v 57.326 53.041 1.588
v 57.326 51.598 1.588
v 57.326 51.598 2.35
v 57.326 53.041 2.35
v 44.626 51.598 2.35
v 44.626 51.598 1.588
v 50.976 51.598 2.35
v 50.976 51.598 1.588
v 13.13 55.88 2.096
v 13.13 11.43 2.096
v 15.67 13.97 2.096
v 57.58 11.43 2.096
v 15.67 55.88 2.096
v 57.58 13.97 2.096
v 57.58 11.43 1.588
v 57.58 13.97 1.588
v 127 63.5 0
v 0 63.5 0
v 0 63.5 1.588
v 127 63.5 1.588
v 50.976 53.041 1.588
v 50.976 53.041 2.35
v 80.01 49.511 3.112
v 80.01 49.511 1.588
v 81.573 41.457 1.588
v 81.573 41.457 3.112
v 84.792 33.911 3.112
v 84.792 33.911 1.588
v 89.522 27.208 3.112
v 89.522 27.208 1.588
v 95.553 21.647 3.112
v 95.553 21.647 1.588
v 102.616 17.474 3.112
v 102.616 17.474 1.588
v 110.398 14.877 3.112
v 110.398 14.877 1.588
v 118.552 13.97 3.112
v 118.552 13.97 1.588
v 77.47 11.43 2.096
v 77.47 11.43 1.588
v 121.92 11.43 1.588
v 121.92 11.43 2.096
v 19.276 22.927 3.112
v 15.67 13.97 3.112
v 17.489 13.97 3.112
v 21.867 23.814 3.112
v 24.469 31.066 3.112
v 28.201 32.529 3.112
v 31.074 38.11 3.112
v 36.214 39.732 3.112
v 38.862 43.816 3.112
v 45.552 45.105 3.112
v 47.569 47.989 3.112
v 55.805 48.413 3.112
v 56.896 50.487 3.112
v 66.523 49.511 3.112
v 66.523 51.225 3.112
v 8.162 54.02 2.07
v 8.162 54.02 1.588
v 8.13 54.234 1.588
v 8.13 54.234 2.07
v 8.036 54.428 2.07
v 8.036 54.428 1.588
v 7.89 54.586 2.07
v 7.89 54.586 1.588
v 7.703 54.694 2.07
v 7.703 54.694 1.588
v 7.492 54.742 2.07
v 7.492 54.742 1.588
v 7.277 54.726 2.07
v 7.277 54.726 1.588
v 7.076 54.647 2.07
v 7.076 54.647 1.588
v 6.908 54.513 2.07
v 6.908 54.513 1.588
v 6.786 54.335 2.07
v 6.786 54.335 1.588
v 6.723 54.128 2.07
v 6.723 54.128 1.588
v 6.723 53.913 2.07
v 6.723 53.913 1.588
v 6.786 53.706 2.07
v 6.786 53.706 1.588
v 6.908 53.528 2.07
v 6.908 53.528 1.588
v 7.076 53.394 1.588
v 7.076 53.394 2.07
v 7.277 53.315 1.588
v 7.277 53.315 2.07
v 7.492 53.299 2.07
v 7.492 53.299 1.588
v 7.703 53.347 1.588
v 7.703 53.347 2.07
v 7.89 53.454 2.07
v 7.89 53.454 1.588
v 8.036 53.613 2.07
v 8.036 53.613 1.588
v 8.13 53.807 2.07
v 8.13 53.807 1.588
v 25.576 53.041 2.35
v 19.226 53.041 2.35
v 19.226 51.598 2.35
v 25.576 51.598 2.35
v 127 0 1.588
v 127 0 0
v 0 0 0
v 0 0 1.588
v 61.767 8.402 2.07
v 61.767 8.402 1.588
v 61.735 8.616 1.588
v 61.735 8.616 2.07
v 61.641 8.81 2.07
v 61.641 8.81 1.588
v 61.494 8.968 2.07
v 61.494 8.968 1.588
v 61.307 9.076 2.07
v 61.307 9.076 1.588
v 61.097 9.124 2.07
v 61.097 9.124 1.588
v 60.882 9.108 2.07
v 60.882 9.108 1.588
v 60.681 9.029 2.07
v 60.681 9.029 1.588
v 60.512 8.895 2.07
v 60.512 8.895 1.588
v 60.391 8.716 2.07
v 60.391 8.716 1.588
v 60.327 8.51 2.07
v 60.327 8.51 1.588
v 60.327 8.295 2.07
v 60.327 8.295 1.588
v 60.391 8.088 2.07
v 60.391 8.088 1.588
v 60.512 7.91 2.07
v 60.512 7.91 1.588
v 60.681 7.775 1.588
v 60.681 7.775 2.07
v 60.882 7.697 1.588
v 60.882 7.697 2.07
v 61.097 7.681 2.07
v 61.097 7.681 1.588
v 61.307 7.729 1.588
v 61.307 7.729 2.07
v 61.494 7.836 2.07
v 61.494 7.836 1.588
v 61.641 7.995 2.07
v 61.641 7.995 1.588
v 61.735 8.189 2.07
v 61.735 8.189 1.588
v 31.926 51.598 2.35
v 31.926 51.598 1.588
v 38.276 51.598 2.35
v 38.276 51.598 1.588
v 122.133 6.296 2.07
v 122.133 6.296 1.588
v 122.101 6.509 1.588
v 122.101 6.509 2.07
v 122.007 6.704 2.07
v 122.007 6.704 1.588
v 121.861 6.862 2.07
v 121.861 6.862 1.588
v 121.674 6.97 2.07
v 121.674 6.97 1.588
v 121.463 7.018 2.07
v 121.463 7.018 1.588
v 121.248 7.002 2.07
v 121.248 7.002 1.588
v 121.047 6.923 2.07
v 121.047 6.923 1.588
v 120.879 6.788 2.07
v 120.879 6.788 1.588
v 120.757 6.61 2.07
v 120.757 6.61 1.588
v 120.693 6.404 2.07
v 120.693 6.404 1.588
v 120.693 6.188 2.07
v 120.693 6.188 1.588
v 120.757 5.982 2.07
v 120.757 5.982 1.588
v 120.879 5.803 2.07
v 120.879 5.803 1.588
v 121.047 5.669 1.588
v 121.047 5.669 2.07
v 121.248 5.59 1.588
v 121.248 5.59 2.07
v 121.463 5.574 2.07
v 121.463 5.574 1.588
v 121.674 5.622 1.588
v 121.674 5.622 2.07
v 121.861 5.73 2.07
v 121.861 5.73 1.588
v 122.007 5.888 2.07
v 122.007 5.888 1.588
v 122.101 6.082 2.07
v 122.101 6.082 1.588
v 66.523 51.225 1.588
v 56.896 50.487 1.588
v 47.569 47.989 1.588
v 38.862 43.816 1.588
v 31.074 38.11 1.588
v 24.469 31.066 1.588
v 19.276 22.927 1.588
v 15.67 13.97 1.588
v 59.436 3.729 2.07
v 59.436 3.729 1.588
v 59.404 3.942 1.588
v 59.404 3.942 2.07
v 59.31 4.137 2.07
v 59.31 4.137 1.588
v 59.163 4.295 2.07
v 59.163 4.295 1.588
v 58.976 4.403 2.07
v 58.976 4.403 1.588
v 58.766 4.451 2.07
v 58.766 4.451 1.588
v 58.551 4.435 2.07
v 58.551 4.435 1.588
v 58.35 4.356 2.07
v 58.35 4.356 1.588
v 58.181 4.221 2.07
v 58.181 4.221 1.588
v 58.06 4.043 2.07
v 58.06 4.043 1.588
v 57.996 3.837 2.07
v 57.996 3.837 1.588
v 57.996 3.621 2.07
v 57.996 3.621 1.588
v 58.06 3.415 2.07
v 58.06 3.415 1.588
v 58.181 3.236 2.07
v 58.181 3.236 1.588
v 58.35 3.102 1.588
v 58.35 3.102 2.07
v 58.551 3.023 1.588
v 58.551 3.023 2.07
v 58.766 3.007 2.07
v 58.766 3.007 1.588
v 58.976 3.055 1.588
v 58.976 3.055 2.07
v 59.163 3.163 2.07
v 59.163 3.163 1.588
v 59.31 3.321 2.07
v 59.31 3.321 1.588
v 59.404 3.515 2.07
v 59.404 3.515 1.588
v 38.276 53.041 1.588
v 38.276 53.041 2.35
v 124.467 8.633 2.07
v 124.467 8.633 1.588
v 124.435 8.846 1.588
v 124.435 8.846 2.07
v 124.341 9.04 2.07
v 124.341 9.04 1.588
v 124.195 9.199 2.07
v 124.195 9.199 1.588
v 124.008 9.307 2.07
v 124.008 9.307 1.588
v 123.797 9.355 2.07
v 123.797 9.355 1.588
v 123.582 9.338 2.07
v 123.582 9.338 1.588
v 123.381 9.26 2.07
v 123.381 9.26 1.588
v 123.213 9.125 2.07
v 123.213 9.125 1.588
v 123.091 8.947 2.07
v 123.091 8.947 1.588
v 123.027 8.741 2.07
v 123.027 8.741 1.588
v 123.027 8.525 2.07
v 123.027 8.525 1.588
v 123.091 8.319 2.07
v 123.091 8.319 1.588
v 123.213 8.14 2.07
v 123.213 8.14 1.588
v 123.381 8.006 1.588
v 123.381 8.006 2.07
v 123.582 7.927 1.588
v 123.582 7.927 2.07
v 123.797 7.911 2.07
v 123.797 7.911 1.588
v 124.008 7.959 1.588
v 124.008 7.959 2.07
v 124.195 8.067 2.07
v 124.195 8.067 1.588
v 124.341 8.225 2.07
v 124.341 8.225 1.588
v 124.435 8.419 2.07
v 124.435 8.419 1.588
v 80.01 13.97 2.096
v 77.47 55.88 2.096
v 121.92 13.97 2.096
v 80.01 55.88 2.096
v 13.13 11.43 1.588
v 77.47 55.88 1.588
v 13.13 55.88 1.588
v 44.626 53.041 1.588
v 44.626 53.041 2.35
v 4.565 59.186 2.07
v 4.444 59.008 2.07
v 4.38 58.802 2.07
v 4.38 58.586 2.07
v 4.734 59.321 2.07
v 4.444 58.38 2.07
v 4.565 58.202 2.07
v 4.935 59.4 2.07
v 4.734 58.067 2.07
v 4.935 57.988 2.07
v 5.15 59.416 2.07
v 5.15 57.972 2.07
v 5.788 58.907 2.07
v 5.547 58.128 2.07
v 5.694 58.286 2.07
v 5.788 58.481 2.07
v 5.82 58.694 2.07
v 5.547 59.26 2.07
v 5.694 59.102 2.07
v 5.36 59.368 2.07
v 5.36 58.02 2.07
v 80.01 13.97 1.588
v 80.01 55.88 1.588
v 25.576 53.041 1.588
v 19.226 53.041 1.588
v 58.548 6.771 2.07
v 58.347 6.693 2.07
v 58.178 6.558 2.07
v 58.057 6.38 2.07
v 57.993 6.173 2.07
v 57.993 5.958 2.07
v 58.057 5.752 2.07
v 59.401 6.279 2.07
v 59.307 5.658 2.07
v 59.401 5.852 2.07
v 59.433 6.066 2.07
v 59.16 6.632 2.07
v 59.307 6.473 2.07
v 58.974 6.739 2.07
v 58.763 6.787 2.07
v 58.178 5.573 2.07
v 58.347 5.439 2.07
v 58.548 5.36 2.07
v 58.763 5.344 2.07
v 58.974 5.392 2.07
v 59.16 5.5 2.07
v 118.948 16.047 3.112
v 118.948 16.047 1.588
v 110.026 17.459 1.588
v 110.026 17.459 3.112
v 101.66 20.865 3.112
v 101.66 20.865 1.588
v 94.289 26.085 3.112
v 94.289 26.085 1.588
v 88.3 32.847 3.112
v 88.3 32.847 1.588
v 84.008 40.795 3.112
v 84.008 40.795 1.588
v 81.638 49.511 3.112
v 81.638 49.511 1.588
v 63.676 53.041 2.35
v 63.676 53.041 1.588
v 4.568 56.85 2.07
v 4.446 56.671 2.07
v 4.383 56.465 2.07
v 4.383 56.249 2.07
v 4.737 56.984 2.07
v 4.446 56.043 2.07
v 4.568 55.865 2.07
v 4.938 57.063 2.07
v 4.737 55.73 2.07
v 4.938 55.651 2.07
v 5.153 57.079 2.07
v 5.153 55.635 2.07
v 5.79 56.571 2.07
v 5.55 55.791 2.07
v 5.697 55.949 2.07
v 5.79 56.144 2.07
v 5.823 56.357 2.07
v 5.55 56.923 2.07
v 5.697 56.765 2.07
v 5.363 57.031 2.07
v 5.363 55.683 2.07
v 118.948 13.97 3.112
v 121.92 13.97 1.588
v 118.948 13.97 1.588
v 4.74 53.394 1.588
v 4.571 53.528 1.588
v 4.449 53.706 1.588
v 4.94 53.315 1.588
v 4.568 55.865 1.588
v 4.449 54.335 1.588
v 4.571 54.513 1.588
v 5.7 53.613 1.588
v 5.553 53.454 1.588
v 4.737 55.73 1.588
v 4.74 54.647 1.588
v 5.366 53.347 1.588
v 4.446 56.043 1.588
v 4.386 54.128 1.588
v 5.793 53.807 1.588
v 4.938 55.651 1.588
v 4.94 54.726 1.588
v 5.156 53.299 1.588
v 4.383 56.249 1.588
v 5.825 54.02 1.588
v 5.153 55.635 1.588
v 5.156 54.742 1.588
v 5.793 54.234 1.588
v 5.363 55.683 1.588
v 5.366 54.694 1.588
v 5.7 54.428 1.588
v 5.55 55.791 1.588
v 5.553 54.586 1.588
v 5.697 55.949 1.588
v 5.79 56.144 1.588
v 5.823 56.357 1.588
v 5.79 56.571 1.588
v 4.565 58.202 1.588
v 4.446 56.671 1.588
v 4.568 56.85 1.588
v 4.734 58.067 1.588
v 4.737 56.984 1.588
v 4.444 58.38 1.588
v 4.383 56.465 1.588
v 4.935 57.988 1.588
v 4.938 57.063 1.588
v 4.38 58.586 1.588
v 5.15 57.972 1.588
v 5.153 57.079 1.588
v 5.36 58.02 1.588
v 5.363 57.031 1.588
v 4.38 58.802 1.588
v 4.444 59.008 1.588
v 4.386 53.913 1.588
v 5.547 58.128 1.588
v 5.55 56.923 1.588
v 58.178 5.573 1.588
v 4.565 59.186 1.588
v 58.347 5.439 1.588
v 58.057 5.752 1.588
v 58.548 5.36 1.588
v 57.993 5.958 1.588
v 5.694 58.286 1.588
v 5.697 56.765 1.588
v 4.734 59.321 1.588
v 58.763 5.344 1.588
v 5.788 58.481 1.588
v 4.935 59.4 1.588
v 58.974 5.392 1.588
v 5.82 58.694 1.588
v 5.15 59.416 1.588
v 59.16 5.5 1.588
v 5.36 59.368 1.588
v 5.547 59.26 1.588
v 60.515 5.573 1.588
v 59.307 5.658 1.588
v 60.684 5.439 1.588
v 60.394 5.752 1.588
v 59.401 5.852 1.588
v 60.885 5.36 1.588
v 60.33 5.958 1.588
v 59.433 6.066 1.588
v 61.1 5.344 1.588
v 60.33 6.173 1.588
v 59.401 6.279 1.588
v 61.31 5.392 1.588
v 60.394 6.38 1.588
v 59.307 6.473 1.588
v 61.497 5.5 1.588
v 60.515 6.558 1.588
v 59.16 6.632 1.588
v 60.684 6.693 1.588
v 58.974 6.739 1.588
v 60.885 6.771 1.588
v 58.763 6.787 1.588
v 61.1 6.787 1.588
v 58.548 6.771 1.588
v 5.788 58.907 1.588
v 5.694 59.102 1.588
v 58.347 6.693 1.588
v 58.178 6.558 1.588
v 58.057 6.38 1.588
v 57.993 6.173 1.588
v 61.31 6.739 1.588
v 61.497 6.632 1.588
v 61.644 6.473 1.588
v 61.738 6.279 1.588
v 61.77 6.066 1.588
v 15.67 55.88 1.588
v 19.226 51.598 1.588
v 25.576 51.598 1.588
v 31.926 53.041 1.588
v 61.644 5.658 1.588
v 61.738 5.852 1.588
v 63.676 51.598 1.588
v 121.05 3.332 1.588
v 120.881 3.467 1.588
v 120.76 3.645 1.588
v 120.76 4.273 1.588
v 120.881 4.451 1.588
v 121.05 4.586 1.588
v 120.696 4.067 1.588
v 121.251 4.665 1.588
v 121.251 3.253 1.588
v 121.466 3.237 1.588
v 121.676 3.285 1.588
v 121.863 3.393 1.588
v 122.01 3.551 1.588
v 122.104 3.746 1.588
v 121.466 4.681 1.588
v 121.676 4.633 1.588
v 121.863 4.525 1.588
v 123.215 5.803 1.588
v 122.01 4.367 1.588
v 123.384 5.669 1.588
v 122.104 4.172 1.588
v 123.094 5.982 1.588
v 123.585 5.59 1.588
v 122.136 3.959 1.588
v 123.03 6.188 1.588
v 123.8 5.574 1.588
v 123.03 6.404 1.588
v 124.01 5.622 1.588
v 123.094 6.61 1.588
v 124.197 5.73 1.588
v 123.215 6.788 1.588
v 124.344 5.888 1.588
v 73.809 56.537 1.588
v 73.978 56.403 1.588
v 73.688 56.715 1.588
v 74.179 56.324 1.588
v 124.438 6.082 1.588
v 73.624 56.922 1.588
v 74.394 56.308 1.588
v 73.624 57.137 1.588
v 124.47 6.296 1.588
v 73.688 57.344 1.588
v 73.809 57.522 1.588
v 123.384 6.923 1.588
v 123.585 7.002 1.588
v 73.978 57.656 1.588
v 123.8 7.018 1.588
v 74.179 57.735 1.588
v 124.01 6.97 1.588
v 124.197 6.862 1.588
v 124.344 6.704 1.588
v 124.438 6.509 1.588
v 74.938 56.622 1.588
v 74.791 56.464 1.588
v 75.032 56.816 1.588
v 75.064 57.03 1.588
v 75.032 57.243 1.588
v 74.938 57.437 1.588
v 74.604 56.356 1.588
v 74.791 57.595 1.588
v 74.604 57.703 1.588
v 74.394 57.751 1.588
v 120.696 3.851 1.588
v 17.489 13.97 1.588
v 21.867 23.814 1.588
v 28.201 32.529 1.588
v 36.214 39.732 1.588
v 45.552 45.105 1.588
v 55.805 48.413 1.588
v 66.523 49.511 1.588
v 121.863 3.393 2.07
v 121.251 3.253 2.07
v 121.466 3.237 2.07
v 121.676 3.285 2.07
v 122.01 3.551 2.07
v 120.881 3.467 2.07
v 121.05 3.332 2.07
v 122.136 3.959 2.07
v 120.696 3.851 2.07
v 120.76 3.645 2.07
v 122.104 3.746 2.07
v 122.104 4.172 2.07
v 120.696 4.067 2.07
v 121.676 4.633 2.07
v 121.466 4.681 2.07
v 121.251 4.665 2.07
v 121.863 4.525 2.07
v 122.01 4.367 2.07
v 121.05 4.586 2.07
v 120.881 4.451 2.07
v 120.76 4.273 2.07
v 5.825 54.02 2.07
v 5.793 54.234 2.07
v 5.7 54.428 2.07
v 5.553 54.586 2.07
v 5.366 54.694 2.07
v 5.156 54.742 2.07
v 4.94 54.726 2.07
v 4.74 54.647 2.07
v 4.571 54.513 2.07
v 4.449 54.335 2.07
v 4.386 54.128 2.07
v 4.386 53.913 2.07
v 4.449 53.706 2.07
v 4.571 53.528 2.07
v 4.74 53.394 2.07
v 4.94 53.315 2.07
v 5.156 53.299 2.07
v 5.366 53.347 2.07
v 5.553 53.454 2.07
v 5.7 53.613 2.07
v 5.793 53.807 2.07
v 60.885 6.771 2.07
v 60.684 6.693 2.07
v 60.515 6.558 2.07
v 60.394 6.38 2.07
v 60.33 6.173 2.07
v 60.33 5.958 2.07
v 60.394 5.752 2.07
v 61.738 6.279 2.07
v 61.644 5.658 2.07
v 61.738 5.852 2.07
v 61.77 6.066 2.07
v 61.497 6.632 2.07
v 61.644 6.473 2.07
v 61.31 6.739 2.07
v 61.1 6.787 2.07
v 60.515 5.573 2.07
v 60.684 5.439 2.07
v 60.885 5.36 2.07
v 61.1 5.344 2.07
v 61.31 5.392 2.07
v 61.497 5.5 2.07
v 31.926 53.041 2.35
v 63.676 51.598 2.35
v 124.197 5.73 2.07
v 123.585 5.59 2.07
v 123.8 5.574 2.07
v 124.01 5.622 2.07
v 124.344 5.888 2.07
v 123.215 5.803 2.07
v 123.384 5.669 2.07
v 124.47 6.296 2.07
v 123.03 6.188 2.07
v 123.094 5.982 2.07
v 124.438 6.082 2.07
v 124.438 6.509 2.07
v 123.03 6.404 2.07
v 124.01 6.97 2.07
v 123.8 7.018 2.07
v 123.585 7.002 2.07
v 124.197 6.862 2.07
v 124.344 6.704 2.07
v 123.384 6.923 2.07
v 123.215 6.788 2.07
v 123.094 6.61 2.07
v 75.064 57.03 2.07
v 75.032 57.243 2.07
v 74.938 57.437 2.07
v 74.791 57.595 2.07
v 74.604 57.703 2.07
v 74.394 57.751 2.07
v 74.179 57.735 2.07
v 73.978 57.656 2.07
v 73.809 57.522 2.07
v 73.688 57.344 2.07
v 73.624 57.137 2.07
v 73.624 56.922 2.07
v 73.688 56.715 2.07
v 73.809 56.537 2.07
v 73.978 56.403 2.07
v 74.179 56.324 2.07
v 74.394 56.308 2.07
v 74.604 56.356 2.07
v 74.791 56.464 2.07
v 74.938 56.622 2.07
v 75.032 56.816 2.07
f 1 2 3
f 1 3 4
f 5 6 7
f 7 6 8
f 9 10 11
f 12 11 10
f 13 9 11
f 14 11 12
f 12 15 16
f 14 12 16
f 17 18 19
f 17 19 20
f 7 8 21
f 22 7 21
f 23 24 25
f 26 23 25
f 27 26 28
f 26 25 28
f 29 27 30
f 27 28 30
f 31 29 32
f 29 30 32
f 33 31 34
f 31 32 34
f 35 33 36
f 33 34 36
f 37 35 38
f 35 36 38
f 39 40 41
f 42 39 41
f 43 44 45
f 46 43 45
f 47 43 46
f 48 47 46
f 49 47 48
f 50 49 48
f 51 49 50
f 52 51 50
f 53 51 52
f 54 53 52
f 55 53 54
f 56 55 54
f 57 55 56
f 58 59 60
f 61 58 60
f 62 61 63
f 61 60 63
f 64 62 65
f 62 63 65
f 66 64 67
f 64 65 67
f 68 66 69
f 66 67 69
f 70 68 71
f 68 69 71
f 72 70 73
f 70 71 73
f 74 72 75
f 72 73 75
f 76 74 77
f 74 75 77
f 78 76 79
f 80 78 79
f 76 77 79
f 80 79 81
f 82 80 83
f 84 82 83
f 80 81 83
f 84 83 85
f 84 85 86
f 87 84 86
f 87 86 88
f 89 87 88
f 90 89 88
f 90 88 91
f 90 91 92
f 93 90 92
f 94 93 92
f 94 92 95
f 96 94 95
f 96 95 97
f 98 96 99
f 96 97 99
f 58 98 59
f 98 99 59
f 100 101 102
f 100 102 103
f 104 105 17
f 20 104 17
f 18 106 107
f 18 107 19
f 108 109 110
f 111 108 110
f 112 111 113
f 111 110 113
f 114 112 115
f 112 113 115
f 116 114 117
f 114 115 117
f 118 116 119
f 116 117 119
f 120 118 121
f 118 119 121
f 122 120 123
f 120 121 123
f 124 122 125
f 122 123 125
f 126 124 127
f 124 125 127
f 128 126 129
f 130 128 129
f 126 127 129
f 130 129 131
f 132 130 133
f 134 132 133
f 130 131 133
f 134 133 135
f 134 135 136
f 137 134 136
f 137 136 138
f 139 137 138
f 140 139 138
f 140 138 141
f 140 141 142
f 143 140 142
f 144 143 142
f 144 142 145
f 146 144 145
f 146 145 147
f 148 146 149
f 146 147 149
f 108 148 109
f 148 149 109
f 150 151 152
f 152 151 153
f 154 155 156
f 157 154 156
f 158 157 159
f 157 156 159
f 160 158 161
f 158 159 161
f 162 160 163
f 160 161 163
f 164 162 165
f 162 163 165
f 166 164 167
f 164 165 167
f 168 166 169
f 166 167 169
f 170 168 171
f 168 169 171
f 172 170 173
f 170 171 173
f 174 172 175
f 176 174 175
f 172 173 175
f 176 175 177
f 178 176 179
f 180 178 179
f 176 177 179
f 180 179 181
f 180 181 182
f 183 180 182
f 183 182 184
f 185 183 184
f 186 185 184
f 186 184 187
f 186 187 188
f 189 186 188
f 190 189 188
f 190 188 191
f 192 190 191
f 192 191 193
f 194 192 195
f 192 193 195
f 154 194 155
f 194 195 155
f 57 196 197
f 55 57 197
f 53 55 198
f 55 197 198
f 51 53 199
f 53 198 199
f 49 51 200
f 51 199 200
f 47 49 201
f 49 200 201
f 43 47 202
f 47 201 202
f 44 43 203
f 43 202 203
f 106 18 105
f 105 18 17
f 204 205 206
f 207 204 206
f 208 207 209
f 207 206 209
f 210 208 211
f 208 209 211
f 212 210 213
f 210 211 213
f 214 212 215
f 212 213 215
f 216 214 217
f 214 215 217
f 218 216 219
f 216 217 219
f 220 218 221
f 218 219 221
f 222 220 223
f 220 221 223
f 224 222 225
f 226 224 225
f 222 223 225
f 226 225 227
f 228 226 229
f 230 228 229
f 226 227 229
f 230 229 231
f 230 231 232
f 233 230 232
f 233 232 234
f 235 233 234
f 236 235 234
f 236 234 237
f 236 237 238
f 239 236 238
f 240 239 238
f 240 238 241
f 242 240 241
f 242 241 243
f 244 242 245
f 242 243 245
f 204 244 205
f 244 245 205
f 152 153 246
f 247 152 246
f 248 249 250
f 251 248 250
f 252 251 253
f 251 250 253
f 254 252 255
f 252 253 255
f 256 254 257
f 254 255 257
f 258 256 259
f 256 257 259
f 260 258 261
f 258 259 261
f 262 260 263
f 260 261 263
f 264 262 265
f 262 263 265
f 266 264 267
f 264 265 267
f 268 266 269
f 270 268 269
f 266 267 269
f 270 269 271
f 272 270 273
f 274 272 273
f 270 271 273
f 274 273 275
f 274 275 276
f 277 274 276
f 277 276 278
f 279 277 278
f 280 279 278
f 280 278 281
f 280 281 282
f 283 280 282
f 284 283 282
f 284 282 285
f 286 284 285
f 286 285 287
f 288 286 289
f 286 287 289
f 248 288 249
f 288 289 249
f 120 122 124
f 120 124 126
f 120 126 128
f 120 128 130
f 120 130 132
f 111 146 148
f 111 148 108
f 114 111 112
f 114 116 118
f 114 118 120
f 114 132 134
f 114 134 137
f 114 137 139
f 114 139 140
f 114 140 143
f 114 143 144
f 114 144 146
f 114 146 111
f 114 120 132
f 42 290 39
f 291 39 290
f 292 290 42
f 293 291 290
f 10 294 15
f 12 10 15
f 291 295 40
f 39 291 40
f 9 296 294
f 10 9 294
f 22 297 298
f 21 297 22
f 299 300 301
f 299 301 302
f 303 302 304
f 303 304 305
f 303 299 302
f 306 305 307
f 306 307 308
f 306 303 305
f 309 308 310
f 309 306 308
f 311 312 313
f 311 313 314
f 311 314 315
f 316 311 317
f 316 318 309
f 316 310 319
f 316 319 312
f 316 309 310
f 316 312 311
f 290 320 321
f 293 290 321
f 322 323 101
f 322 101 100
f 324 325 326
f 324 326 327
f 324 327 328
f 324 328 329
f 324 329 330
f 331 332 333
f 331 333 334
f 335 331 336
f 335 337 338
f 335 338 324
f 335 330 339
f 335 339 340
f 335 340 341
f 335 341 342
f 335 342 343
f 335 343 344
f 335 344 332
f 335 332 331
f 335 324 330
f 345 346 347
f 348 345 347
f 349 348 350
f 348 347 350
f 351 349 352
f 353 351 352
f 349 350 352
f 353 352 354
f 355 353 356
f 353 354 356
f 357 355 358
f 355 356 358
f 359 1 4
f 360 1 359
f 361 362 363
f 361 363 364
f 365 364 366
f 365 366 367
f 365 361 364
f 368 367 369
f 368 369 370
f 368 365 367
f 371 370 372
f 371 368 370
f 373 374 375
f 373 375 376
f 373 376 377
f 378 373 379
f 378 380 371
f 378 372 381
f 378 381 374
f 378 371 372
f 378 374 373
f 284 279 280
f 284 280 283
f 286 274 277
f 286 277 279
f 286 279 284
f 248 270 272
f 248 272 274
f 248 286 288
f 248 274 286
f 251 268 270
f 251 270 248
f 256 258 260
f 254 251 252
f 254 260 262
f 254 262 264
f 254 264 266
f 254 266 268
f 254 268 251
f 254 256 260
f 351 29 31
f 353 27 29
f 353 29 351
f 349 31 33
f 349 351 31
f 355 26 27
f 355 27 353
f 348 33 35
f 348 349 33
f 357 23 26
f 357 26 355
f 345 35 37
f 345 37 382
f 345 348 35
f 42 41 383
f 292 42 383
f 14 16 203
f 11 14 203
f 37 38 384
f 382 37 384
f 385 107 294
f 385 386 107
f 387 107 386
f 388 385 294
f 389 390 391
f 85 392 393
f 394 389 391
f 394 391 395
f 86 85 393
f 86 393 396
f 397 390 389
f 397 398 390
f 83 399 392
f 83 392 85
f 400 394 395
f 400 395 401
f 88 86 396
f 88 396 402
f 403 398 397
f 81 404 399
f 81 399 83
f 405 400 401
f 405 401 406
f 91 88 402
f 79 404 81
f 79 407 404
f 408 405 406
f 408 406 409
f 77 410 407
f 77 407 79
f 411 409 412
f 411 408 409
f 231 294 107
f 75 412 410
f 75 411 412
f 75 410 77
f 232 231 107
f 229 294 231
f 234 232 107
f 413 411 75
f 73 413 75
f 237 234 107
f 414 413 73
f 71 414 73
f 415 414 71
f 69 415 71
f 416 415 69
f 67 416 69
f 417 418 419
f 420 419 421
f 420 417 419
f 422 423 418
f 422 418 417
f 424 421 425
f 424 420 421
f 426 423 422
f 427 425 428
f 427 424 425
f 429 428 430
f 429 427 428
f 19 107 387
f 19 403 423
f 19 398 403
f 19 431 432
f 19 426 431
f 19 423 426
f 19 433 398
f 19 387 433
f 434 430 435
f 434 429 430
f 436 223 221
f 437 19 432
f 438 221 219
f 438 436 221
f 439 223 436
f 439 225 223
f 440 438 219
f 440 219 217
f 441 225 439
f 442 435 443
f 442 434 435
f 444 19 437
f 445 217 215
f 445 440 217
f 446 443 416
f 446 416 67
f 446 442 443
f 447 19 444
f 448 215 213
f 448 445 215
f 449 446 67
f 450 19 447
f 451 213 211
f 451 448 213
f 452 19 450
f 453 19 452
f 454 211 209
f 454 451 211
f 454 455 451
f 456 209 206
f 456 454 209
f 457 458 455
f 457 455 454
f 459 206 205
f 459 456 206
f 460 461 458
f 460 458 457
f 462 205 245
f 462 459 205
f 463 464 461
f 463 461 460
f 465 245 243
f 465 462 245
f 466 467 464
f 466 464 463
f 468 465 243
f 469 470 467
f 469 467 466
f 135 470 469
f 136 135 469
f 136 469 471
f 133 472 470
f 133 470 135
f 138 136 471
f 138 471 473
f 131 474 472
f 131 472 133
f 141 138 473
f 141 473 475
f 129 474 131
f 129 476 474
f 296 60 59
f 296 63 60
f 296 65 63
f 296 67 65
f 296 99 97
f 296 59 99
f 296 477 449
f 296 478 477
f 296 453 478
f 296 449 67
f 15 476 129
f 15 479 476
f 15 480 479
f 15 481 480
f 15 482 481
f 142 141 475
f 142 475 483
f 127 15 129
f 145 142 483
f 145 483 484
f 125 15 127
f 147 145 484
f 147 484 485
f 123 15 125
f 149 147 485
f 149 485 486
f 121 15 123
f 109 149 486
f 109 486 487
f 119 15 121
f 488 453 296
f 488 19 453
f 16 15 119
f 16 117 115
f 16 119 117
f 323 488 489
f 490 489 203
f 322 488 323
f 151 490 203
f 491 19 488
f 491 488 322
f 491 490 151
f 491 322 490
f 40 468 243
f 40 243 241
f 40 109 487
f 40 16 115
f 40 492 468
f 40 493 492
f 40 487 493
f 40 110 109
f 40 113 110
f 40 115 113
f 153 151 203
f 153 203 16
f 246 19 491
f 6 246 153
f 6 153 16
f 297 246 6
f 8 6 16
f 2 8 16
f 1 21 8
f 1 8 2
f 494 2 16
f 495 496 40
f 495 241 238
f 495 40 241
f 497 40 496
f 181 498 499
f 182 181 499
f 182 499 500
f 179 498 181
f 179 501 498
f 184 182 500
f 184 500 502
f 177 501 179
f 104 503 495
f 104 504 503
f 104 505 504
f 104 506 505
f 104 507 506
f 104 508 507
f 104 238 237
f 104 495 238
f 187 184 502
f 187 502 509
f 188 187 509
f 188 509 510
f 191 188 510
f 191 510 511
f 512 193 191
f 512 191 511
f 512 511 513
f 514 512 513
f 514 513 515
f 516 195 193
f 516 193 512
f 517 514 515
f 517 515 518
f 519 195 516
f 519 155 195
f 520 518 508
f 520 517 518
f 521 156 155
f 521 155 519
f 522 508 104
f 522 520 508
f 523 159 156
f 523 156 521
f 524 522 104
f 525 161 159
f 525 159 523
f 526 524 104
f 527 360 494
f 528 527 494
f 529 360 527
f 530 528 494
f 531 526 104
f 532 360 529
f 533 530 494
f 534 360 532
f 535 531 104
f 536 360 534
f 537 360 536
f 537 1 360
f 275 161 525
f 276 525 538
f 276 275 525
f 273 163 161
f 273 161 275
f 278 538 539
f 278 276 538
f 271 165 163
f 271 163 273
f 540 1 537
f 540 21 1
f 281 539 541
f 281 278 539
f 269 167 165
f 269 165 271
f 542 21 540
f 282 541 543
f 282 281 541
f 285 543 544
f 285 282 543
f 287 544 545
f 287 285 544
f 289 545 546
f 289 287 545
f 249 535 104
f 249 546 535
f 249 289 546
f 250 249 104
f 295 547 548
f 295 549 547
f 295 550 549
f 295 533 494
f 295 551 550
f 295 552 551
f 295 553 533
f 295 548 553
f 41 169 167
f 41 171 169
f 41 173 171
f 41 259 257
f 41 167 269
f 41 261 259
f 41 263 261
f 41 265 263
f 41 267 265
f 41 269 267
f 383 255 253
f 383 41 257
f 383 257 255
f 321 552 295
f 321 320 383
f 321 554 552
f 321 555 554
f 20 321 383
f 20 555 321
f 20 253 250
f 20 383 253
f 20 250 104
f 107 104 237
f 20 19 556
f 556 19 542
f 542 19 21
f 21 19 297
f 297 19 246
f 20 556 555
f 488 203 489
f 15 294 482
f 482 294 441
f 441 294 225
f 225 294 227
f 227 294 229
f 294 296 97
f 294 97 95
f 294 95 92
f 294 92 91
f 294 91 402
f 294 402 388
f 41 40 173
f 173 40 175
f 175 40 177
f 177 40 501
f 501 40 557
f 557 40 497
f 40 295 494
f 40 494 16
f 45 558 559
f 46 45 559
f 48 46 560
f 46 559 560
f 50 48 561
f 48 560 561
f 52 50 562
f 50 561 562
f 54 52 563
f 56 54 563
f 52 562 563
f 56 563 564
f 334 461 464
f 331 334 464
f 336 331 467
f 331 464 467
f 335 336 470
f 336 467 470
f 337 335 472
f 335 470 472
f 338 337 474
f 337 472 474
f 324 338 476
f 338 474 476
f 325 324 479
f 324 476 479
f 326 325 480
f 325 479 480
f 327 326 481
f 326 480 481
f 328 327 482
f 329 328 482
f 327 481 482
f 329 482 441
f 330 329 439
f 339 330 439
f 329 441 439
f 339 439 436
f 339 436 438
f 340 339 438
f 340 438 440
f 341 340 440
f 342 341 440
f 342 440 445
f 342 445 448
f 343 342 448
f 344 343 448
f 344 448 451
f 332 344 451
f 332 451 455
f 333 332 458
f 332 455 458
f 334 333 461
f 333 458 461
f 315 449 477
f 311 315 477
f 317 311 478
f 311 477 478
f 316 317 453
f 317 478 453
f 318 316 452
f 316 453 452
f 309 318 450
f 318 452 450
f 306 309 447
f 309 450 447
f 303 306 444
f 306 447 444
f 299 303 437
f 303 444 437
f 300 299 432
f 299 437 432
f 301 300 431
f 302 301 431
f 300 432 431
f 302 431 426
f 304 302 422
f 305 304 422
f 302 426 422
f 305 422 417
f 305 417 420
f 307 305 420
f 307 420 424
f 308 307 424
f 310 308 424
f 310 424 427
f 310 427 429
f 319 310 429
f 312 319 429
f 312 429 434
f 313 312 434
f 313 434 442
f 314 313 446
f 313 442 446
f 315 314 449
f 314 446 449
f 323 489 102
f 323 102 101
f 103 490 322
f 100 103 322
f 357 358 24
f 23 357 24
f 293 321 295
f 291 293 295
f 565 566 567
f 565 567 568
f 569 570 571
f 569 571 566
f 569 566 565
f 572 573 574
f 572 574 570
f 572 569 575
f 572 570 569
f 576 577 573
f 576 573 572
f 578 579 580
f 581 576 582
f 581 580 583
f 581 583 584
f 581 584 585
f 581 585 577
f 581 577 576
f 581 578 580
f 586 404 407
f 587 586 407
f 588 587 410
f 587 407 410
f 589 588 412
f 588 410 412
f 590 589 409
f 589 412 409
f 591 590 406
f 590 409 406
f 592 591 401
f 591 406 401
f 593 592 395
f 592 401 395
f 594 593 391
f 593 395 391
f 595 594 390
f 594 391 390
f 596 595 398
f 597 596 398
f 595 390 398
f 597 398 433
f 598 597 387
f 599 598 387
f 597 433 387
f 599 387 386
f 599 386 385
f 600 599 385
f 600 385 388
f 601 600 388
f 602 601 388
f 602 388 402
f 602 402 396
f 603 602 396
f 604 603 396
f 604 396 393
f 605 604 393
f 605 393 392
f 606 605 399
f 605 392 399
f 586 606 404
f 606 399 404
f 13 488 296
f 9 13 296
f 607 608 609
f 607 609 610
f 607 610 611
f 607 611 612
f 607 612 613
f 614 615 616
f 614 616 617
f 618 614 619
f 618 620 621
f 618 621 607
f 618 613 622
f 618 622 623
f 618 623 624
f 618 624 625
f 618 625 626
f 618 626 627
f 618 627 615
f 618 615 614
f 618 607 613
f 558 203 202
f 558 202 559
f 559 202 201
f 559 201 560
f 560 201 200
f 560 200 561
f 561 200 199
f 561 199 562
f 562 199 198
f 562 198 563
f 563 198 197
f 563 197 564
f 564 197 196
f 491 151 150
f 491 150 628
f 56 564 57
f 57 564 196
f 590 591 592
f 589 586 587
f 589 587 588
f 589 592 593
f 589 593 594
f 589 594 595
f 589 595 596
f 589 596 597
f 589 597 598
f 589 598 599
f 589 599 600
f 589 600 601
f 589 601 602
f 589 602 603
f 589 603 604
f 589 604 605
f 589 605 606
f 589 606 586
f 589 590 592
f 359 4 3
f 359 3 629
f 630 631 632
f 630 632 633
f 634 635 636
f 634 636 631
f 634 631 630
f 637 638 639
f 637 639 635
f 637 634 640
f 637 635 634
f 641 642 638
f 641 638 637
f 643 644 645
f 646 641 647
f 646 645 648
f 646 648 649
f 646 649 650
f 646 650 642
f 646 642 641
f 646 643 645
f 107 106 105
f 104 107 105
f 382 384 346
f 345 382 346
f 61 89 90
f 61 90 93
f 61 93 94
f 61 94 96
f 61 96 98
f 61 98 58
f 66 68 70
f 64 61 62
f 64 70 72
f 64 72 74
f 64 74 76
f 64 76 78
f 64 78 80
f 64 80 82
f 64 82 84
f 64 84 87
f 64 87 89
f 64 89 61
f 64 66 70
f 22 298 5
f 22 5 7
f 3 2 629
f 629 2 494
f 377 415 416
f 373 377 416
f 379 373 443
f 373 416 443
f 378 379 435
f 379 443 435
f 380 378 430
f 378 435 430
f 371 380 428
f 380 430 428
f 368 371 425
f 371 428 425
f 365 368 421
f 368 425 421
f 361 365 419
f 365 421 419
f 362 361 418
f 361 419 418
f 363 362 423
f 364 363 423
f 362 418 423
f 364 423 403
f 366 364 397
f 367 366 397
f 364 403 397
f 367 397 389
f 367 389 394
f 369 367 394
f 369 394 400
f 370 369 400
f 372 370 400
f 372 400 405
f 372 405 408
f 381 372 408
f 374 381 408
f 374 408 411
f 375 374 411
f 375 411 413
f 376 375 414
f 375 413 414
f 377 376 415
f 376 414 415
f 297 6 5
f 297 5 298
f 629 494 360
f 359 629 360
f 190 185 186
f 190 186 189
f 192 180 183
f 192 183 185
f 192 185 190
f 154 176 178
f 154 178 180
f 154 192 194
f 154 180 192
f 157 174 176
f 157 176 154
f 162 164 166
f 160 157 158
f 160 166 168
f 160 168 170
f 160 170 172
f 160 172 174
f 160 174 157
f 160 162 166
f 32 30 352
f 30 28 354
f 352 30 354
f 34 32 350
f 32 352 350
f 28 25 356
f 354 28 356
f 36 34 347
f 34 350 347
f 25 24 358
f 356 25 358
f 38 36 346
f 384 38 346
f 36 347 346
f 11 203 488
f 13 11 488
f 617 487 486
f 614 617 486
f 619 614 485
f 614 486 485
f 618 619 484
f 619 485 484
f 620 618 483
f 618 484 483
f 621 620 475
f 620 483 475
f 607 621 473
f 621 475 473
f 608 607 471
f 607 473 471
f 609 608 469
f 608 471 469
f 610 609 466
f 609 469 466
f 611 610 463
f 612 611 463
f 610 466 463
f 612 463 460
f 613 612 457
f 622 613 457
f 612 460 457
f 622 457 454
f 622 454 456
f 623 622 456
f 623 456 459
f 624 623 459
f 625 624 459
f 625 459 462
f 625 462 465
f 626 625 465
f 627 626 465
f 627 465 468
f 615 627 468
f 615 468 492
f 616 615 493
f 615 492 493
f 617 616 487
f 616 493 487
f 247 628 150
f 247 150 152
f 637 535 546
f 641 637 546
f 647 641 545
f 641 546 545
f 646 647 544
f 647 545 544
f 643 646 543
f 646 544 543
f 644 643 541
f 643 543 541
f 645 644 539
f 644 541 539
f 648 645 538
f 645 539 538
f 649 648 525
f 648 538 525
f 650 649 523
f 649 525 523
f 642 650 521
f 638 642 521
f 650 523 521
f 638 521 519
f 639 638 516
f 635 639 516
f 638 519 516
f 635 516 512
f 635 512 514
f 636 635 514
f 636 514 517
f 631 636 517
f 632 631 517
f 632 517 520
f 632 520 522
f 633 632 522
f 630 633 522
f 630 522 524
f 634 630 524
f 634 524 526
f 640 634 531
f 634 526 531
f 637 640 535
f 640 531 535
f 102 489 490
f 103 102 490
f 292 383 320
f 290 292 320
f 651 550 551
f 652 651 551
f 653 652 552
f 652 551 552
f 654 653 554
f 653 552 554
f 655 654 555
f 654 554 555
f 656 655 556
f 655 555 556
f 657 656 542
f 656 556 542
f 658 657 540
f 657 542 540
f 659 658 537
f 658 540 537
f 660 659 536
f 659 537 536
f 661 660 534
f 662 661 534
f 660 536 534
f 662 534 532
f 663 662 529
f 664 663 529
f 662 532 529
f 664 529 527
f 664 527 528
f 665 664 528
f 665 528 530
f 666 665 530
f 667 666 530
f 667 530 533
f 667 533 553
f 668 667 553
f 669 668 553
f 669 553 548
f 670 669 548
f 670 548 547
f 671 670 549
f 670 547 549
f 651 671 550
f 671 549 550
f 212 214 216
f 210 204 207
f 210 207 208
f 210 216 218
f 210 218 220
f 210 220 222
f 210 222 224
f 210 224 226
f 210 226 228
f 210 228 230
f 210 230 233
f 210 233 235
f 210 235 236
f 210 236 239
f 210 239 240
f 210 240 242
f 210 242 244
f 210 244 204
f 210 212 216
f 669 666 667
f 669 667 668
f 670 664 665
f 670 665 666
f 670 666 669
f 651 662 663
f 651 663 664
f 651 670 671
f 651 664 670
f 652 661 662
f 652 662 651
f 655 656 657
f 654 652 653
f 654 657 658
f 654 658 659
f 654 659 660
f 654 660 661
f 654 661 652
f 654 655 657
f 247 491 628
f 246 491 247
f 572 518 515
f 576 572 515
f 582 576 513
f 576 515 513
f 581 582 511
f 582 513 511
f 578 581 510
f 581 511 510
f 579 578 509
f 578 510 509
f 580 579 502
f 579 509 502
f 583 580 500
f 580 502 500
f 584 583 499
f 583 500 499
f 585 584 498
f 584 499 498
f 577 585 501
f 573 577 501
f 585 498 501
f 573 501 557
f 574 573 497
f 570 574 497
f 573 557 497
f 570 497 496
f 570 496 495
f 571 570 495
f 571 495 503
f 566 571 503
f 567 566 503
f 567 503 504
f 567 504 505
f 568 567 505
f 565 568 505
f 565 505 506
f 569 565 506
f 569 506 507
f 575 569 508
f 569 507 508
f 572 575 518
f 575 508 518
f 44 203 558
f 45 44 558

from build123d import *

# Parameters (mm, degrees)
F0_W     = 127
F0_H     = 63.5
F1_DEPTH = 1.5875
F3_DEPTH = 0.508
F4_W     = 6.35
F4_H     = 1.4422908425
F5_DEPTH = 0.762
F7_DEPTH = 1.524
F8_R     = 0.7239
F9_DEPTH = 0.4826


# Not quite as in the source:
# - a feature names something its author has since deleted; it is built from what else it names


with BuildPart() as f1:
    # F0 (on Top) → F1 (new body)
    with BuildSketch(Plane.XY):
        with Locations((63.5, 31.75)):
            Rectangle(F0_W, F0_H)
    extrude(amount=F1_DEPTH)

    # F2 (on face) → F3 (join)
    with BuildSketch(Plane.XY.offset(1.5875)):
        Polygon((15.6702585518, 55.88), (13.1302586973, 55.88), (13.1302586973, 11.43), (57.5802586973, 11.43), (57.5802586973, 13.9699998546), (55.0402588427, 13.9699998546), (15.6702585518, 13.9699998546), (15.6702585518, 53.3400001454), align=None)
        Polygon((80.009996891, 55.88), (77.47, 55.88), (77.47, 11.43), (121.92, 11.43), (121.92, 13.969996891), (119.380003109, 13.969996891), (80.009996891, 13.969996891), (80.009996891, 53.340003109), align=None)
    extrude(amount=F3_DEPTH)

    # F4 (on face) → F5 (join)
    with BuildSketch(Plane.XY.offset(1.5875)):
        with Locations((60.5010928452, 52.3195564747)):
            Rectangle(F4_W, F4_H)
        with Locations((47.8010928452, 52.3195564747)):
            Rectangle(F4_W, F4_H)
        with Locations((35.1010928452, 52.3195564747)):
            Rectangle(F4_W, F4_H)
        with Locations((22.4010928452, 52.3195564747)):
            Rectangle(F4_W, F4_H)
    extrude(amount=F5_DEPTH)

    # F8 (on face) → F9 (join)
    with BuildSketch(Plane.XY.offset(1.5875)):
        with Locations((5.095858312, 58.6940389134)):
            Circle(F8_R)
        with Locations((5.0986883188, 56.357240627)):
            Circle(F8_R)
        with Locations((5.1015183256, 54.0204423407)):
            Circle(F8_R)
        with Locations((7.4383183256, 54.0204423407)):
            Circle(F8_R)
        with Locations((58.7118677795, 3.7288046442)):
            Circle(F8_R)
        with Locations((58.7090377727, 6.0656029305)):
            Circle(F8_R)
        with Locations((61.0458377727, 6.0656029305)):
            Circle(F8_R)
        with Locations((61.043007766, 8.4024012169)):
            Circle(F8_R)
        with Locations((74.3398889899, 57.0295006037)):
            Circle(F8_R)
        with Locations((121.4120164514, 3.9590690285)):
            Circle(F8_R)
        with Locations((121.4091864446, 6.2958673148)):
            Circle(F8_R)
        with Locations((123.7431564378, 8.6326656012)):
            Circle(F8_R)
        with Locations((123.7459864446, 6.2958673148)):
            Circle(F8_R)
    extrude(amount=F9_DEPTH)


with BuildPart() as f7:
    # F6 (on face) → F7 (new body)
    with BuildSketch(Plane.XY.offset(1.5875)):
        with BuildLine():
            Line((81.6376388848, 49.51094836), (80.009996891, 49.51094836))
            ThreePointArc((80.009996891, 49.51094836), (92.3901641709, 24.2680426815), (118.5516450515, 13.969996891))
            Line((118.5516450515, 13.969996891), (118.9480349422, 13.969996891))
            Line((118.9480349422, 13.969996891), (118.9480349422, 16.0472020507))
            ThreePointArc((118.9480349422, 16.0472020507), (94.289218877, 26.0853426911), (81.6376388848, 49.51094836))
        make_face()
    extrude(amount=F7_DEPTH)


with BuildPart() as f7b:
    # F6 (on face) → F7, piece 2 (new body)
    with BuildSketch(Plane.XY.offset(1.5875)):
        with BuildLine():
            Line((66.5227174759, 49.51094836), (66.5227174759, 51.2246415019))
            ThreePointArc((66.5227174759, 51.2246415019), (34.8358116044, 41.1431226473), (15.6702585518, 13.9699998546))
            Line((15.6702585518, 13.9699998546), (17.489053309, 13.9699998546))
            ThreePointArc((17.489053309, 13.9699998546), (36.2136378026, 39.7316824187), (66.5227174759, 49.51094836))
        make_face()
    extrude(amount=F7_DEPTH)


solid = Compound([f1.part, f7.part, f7b.part])
